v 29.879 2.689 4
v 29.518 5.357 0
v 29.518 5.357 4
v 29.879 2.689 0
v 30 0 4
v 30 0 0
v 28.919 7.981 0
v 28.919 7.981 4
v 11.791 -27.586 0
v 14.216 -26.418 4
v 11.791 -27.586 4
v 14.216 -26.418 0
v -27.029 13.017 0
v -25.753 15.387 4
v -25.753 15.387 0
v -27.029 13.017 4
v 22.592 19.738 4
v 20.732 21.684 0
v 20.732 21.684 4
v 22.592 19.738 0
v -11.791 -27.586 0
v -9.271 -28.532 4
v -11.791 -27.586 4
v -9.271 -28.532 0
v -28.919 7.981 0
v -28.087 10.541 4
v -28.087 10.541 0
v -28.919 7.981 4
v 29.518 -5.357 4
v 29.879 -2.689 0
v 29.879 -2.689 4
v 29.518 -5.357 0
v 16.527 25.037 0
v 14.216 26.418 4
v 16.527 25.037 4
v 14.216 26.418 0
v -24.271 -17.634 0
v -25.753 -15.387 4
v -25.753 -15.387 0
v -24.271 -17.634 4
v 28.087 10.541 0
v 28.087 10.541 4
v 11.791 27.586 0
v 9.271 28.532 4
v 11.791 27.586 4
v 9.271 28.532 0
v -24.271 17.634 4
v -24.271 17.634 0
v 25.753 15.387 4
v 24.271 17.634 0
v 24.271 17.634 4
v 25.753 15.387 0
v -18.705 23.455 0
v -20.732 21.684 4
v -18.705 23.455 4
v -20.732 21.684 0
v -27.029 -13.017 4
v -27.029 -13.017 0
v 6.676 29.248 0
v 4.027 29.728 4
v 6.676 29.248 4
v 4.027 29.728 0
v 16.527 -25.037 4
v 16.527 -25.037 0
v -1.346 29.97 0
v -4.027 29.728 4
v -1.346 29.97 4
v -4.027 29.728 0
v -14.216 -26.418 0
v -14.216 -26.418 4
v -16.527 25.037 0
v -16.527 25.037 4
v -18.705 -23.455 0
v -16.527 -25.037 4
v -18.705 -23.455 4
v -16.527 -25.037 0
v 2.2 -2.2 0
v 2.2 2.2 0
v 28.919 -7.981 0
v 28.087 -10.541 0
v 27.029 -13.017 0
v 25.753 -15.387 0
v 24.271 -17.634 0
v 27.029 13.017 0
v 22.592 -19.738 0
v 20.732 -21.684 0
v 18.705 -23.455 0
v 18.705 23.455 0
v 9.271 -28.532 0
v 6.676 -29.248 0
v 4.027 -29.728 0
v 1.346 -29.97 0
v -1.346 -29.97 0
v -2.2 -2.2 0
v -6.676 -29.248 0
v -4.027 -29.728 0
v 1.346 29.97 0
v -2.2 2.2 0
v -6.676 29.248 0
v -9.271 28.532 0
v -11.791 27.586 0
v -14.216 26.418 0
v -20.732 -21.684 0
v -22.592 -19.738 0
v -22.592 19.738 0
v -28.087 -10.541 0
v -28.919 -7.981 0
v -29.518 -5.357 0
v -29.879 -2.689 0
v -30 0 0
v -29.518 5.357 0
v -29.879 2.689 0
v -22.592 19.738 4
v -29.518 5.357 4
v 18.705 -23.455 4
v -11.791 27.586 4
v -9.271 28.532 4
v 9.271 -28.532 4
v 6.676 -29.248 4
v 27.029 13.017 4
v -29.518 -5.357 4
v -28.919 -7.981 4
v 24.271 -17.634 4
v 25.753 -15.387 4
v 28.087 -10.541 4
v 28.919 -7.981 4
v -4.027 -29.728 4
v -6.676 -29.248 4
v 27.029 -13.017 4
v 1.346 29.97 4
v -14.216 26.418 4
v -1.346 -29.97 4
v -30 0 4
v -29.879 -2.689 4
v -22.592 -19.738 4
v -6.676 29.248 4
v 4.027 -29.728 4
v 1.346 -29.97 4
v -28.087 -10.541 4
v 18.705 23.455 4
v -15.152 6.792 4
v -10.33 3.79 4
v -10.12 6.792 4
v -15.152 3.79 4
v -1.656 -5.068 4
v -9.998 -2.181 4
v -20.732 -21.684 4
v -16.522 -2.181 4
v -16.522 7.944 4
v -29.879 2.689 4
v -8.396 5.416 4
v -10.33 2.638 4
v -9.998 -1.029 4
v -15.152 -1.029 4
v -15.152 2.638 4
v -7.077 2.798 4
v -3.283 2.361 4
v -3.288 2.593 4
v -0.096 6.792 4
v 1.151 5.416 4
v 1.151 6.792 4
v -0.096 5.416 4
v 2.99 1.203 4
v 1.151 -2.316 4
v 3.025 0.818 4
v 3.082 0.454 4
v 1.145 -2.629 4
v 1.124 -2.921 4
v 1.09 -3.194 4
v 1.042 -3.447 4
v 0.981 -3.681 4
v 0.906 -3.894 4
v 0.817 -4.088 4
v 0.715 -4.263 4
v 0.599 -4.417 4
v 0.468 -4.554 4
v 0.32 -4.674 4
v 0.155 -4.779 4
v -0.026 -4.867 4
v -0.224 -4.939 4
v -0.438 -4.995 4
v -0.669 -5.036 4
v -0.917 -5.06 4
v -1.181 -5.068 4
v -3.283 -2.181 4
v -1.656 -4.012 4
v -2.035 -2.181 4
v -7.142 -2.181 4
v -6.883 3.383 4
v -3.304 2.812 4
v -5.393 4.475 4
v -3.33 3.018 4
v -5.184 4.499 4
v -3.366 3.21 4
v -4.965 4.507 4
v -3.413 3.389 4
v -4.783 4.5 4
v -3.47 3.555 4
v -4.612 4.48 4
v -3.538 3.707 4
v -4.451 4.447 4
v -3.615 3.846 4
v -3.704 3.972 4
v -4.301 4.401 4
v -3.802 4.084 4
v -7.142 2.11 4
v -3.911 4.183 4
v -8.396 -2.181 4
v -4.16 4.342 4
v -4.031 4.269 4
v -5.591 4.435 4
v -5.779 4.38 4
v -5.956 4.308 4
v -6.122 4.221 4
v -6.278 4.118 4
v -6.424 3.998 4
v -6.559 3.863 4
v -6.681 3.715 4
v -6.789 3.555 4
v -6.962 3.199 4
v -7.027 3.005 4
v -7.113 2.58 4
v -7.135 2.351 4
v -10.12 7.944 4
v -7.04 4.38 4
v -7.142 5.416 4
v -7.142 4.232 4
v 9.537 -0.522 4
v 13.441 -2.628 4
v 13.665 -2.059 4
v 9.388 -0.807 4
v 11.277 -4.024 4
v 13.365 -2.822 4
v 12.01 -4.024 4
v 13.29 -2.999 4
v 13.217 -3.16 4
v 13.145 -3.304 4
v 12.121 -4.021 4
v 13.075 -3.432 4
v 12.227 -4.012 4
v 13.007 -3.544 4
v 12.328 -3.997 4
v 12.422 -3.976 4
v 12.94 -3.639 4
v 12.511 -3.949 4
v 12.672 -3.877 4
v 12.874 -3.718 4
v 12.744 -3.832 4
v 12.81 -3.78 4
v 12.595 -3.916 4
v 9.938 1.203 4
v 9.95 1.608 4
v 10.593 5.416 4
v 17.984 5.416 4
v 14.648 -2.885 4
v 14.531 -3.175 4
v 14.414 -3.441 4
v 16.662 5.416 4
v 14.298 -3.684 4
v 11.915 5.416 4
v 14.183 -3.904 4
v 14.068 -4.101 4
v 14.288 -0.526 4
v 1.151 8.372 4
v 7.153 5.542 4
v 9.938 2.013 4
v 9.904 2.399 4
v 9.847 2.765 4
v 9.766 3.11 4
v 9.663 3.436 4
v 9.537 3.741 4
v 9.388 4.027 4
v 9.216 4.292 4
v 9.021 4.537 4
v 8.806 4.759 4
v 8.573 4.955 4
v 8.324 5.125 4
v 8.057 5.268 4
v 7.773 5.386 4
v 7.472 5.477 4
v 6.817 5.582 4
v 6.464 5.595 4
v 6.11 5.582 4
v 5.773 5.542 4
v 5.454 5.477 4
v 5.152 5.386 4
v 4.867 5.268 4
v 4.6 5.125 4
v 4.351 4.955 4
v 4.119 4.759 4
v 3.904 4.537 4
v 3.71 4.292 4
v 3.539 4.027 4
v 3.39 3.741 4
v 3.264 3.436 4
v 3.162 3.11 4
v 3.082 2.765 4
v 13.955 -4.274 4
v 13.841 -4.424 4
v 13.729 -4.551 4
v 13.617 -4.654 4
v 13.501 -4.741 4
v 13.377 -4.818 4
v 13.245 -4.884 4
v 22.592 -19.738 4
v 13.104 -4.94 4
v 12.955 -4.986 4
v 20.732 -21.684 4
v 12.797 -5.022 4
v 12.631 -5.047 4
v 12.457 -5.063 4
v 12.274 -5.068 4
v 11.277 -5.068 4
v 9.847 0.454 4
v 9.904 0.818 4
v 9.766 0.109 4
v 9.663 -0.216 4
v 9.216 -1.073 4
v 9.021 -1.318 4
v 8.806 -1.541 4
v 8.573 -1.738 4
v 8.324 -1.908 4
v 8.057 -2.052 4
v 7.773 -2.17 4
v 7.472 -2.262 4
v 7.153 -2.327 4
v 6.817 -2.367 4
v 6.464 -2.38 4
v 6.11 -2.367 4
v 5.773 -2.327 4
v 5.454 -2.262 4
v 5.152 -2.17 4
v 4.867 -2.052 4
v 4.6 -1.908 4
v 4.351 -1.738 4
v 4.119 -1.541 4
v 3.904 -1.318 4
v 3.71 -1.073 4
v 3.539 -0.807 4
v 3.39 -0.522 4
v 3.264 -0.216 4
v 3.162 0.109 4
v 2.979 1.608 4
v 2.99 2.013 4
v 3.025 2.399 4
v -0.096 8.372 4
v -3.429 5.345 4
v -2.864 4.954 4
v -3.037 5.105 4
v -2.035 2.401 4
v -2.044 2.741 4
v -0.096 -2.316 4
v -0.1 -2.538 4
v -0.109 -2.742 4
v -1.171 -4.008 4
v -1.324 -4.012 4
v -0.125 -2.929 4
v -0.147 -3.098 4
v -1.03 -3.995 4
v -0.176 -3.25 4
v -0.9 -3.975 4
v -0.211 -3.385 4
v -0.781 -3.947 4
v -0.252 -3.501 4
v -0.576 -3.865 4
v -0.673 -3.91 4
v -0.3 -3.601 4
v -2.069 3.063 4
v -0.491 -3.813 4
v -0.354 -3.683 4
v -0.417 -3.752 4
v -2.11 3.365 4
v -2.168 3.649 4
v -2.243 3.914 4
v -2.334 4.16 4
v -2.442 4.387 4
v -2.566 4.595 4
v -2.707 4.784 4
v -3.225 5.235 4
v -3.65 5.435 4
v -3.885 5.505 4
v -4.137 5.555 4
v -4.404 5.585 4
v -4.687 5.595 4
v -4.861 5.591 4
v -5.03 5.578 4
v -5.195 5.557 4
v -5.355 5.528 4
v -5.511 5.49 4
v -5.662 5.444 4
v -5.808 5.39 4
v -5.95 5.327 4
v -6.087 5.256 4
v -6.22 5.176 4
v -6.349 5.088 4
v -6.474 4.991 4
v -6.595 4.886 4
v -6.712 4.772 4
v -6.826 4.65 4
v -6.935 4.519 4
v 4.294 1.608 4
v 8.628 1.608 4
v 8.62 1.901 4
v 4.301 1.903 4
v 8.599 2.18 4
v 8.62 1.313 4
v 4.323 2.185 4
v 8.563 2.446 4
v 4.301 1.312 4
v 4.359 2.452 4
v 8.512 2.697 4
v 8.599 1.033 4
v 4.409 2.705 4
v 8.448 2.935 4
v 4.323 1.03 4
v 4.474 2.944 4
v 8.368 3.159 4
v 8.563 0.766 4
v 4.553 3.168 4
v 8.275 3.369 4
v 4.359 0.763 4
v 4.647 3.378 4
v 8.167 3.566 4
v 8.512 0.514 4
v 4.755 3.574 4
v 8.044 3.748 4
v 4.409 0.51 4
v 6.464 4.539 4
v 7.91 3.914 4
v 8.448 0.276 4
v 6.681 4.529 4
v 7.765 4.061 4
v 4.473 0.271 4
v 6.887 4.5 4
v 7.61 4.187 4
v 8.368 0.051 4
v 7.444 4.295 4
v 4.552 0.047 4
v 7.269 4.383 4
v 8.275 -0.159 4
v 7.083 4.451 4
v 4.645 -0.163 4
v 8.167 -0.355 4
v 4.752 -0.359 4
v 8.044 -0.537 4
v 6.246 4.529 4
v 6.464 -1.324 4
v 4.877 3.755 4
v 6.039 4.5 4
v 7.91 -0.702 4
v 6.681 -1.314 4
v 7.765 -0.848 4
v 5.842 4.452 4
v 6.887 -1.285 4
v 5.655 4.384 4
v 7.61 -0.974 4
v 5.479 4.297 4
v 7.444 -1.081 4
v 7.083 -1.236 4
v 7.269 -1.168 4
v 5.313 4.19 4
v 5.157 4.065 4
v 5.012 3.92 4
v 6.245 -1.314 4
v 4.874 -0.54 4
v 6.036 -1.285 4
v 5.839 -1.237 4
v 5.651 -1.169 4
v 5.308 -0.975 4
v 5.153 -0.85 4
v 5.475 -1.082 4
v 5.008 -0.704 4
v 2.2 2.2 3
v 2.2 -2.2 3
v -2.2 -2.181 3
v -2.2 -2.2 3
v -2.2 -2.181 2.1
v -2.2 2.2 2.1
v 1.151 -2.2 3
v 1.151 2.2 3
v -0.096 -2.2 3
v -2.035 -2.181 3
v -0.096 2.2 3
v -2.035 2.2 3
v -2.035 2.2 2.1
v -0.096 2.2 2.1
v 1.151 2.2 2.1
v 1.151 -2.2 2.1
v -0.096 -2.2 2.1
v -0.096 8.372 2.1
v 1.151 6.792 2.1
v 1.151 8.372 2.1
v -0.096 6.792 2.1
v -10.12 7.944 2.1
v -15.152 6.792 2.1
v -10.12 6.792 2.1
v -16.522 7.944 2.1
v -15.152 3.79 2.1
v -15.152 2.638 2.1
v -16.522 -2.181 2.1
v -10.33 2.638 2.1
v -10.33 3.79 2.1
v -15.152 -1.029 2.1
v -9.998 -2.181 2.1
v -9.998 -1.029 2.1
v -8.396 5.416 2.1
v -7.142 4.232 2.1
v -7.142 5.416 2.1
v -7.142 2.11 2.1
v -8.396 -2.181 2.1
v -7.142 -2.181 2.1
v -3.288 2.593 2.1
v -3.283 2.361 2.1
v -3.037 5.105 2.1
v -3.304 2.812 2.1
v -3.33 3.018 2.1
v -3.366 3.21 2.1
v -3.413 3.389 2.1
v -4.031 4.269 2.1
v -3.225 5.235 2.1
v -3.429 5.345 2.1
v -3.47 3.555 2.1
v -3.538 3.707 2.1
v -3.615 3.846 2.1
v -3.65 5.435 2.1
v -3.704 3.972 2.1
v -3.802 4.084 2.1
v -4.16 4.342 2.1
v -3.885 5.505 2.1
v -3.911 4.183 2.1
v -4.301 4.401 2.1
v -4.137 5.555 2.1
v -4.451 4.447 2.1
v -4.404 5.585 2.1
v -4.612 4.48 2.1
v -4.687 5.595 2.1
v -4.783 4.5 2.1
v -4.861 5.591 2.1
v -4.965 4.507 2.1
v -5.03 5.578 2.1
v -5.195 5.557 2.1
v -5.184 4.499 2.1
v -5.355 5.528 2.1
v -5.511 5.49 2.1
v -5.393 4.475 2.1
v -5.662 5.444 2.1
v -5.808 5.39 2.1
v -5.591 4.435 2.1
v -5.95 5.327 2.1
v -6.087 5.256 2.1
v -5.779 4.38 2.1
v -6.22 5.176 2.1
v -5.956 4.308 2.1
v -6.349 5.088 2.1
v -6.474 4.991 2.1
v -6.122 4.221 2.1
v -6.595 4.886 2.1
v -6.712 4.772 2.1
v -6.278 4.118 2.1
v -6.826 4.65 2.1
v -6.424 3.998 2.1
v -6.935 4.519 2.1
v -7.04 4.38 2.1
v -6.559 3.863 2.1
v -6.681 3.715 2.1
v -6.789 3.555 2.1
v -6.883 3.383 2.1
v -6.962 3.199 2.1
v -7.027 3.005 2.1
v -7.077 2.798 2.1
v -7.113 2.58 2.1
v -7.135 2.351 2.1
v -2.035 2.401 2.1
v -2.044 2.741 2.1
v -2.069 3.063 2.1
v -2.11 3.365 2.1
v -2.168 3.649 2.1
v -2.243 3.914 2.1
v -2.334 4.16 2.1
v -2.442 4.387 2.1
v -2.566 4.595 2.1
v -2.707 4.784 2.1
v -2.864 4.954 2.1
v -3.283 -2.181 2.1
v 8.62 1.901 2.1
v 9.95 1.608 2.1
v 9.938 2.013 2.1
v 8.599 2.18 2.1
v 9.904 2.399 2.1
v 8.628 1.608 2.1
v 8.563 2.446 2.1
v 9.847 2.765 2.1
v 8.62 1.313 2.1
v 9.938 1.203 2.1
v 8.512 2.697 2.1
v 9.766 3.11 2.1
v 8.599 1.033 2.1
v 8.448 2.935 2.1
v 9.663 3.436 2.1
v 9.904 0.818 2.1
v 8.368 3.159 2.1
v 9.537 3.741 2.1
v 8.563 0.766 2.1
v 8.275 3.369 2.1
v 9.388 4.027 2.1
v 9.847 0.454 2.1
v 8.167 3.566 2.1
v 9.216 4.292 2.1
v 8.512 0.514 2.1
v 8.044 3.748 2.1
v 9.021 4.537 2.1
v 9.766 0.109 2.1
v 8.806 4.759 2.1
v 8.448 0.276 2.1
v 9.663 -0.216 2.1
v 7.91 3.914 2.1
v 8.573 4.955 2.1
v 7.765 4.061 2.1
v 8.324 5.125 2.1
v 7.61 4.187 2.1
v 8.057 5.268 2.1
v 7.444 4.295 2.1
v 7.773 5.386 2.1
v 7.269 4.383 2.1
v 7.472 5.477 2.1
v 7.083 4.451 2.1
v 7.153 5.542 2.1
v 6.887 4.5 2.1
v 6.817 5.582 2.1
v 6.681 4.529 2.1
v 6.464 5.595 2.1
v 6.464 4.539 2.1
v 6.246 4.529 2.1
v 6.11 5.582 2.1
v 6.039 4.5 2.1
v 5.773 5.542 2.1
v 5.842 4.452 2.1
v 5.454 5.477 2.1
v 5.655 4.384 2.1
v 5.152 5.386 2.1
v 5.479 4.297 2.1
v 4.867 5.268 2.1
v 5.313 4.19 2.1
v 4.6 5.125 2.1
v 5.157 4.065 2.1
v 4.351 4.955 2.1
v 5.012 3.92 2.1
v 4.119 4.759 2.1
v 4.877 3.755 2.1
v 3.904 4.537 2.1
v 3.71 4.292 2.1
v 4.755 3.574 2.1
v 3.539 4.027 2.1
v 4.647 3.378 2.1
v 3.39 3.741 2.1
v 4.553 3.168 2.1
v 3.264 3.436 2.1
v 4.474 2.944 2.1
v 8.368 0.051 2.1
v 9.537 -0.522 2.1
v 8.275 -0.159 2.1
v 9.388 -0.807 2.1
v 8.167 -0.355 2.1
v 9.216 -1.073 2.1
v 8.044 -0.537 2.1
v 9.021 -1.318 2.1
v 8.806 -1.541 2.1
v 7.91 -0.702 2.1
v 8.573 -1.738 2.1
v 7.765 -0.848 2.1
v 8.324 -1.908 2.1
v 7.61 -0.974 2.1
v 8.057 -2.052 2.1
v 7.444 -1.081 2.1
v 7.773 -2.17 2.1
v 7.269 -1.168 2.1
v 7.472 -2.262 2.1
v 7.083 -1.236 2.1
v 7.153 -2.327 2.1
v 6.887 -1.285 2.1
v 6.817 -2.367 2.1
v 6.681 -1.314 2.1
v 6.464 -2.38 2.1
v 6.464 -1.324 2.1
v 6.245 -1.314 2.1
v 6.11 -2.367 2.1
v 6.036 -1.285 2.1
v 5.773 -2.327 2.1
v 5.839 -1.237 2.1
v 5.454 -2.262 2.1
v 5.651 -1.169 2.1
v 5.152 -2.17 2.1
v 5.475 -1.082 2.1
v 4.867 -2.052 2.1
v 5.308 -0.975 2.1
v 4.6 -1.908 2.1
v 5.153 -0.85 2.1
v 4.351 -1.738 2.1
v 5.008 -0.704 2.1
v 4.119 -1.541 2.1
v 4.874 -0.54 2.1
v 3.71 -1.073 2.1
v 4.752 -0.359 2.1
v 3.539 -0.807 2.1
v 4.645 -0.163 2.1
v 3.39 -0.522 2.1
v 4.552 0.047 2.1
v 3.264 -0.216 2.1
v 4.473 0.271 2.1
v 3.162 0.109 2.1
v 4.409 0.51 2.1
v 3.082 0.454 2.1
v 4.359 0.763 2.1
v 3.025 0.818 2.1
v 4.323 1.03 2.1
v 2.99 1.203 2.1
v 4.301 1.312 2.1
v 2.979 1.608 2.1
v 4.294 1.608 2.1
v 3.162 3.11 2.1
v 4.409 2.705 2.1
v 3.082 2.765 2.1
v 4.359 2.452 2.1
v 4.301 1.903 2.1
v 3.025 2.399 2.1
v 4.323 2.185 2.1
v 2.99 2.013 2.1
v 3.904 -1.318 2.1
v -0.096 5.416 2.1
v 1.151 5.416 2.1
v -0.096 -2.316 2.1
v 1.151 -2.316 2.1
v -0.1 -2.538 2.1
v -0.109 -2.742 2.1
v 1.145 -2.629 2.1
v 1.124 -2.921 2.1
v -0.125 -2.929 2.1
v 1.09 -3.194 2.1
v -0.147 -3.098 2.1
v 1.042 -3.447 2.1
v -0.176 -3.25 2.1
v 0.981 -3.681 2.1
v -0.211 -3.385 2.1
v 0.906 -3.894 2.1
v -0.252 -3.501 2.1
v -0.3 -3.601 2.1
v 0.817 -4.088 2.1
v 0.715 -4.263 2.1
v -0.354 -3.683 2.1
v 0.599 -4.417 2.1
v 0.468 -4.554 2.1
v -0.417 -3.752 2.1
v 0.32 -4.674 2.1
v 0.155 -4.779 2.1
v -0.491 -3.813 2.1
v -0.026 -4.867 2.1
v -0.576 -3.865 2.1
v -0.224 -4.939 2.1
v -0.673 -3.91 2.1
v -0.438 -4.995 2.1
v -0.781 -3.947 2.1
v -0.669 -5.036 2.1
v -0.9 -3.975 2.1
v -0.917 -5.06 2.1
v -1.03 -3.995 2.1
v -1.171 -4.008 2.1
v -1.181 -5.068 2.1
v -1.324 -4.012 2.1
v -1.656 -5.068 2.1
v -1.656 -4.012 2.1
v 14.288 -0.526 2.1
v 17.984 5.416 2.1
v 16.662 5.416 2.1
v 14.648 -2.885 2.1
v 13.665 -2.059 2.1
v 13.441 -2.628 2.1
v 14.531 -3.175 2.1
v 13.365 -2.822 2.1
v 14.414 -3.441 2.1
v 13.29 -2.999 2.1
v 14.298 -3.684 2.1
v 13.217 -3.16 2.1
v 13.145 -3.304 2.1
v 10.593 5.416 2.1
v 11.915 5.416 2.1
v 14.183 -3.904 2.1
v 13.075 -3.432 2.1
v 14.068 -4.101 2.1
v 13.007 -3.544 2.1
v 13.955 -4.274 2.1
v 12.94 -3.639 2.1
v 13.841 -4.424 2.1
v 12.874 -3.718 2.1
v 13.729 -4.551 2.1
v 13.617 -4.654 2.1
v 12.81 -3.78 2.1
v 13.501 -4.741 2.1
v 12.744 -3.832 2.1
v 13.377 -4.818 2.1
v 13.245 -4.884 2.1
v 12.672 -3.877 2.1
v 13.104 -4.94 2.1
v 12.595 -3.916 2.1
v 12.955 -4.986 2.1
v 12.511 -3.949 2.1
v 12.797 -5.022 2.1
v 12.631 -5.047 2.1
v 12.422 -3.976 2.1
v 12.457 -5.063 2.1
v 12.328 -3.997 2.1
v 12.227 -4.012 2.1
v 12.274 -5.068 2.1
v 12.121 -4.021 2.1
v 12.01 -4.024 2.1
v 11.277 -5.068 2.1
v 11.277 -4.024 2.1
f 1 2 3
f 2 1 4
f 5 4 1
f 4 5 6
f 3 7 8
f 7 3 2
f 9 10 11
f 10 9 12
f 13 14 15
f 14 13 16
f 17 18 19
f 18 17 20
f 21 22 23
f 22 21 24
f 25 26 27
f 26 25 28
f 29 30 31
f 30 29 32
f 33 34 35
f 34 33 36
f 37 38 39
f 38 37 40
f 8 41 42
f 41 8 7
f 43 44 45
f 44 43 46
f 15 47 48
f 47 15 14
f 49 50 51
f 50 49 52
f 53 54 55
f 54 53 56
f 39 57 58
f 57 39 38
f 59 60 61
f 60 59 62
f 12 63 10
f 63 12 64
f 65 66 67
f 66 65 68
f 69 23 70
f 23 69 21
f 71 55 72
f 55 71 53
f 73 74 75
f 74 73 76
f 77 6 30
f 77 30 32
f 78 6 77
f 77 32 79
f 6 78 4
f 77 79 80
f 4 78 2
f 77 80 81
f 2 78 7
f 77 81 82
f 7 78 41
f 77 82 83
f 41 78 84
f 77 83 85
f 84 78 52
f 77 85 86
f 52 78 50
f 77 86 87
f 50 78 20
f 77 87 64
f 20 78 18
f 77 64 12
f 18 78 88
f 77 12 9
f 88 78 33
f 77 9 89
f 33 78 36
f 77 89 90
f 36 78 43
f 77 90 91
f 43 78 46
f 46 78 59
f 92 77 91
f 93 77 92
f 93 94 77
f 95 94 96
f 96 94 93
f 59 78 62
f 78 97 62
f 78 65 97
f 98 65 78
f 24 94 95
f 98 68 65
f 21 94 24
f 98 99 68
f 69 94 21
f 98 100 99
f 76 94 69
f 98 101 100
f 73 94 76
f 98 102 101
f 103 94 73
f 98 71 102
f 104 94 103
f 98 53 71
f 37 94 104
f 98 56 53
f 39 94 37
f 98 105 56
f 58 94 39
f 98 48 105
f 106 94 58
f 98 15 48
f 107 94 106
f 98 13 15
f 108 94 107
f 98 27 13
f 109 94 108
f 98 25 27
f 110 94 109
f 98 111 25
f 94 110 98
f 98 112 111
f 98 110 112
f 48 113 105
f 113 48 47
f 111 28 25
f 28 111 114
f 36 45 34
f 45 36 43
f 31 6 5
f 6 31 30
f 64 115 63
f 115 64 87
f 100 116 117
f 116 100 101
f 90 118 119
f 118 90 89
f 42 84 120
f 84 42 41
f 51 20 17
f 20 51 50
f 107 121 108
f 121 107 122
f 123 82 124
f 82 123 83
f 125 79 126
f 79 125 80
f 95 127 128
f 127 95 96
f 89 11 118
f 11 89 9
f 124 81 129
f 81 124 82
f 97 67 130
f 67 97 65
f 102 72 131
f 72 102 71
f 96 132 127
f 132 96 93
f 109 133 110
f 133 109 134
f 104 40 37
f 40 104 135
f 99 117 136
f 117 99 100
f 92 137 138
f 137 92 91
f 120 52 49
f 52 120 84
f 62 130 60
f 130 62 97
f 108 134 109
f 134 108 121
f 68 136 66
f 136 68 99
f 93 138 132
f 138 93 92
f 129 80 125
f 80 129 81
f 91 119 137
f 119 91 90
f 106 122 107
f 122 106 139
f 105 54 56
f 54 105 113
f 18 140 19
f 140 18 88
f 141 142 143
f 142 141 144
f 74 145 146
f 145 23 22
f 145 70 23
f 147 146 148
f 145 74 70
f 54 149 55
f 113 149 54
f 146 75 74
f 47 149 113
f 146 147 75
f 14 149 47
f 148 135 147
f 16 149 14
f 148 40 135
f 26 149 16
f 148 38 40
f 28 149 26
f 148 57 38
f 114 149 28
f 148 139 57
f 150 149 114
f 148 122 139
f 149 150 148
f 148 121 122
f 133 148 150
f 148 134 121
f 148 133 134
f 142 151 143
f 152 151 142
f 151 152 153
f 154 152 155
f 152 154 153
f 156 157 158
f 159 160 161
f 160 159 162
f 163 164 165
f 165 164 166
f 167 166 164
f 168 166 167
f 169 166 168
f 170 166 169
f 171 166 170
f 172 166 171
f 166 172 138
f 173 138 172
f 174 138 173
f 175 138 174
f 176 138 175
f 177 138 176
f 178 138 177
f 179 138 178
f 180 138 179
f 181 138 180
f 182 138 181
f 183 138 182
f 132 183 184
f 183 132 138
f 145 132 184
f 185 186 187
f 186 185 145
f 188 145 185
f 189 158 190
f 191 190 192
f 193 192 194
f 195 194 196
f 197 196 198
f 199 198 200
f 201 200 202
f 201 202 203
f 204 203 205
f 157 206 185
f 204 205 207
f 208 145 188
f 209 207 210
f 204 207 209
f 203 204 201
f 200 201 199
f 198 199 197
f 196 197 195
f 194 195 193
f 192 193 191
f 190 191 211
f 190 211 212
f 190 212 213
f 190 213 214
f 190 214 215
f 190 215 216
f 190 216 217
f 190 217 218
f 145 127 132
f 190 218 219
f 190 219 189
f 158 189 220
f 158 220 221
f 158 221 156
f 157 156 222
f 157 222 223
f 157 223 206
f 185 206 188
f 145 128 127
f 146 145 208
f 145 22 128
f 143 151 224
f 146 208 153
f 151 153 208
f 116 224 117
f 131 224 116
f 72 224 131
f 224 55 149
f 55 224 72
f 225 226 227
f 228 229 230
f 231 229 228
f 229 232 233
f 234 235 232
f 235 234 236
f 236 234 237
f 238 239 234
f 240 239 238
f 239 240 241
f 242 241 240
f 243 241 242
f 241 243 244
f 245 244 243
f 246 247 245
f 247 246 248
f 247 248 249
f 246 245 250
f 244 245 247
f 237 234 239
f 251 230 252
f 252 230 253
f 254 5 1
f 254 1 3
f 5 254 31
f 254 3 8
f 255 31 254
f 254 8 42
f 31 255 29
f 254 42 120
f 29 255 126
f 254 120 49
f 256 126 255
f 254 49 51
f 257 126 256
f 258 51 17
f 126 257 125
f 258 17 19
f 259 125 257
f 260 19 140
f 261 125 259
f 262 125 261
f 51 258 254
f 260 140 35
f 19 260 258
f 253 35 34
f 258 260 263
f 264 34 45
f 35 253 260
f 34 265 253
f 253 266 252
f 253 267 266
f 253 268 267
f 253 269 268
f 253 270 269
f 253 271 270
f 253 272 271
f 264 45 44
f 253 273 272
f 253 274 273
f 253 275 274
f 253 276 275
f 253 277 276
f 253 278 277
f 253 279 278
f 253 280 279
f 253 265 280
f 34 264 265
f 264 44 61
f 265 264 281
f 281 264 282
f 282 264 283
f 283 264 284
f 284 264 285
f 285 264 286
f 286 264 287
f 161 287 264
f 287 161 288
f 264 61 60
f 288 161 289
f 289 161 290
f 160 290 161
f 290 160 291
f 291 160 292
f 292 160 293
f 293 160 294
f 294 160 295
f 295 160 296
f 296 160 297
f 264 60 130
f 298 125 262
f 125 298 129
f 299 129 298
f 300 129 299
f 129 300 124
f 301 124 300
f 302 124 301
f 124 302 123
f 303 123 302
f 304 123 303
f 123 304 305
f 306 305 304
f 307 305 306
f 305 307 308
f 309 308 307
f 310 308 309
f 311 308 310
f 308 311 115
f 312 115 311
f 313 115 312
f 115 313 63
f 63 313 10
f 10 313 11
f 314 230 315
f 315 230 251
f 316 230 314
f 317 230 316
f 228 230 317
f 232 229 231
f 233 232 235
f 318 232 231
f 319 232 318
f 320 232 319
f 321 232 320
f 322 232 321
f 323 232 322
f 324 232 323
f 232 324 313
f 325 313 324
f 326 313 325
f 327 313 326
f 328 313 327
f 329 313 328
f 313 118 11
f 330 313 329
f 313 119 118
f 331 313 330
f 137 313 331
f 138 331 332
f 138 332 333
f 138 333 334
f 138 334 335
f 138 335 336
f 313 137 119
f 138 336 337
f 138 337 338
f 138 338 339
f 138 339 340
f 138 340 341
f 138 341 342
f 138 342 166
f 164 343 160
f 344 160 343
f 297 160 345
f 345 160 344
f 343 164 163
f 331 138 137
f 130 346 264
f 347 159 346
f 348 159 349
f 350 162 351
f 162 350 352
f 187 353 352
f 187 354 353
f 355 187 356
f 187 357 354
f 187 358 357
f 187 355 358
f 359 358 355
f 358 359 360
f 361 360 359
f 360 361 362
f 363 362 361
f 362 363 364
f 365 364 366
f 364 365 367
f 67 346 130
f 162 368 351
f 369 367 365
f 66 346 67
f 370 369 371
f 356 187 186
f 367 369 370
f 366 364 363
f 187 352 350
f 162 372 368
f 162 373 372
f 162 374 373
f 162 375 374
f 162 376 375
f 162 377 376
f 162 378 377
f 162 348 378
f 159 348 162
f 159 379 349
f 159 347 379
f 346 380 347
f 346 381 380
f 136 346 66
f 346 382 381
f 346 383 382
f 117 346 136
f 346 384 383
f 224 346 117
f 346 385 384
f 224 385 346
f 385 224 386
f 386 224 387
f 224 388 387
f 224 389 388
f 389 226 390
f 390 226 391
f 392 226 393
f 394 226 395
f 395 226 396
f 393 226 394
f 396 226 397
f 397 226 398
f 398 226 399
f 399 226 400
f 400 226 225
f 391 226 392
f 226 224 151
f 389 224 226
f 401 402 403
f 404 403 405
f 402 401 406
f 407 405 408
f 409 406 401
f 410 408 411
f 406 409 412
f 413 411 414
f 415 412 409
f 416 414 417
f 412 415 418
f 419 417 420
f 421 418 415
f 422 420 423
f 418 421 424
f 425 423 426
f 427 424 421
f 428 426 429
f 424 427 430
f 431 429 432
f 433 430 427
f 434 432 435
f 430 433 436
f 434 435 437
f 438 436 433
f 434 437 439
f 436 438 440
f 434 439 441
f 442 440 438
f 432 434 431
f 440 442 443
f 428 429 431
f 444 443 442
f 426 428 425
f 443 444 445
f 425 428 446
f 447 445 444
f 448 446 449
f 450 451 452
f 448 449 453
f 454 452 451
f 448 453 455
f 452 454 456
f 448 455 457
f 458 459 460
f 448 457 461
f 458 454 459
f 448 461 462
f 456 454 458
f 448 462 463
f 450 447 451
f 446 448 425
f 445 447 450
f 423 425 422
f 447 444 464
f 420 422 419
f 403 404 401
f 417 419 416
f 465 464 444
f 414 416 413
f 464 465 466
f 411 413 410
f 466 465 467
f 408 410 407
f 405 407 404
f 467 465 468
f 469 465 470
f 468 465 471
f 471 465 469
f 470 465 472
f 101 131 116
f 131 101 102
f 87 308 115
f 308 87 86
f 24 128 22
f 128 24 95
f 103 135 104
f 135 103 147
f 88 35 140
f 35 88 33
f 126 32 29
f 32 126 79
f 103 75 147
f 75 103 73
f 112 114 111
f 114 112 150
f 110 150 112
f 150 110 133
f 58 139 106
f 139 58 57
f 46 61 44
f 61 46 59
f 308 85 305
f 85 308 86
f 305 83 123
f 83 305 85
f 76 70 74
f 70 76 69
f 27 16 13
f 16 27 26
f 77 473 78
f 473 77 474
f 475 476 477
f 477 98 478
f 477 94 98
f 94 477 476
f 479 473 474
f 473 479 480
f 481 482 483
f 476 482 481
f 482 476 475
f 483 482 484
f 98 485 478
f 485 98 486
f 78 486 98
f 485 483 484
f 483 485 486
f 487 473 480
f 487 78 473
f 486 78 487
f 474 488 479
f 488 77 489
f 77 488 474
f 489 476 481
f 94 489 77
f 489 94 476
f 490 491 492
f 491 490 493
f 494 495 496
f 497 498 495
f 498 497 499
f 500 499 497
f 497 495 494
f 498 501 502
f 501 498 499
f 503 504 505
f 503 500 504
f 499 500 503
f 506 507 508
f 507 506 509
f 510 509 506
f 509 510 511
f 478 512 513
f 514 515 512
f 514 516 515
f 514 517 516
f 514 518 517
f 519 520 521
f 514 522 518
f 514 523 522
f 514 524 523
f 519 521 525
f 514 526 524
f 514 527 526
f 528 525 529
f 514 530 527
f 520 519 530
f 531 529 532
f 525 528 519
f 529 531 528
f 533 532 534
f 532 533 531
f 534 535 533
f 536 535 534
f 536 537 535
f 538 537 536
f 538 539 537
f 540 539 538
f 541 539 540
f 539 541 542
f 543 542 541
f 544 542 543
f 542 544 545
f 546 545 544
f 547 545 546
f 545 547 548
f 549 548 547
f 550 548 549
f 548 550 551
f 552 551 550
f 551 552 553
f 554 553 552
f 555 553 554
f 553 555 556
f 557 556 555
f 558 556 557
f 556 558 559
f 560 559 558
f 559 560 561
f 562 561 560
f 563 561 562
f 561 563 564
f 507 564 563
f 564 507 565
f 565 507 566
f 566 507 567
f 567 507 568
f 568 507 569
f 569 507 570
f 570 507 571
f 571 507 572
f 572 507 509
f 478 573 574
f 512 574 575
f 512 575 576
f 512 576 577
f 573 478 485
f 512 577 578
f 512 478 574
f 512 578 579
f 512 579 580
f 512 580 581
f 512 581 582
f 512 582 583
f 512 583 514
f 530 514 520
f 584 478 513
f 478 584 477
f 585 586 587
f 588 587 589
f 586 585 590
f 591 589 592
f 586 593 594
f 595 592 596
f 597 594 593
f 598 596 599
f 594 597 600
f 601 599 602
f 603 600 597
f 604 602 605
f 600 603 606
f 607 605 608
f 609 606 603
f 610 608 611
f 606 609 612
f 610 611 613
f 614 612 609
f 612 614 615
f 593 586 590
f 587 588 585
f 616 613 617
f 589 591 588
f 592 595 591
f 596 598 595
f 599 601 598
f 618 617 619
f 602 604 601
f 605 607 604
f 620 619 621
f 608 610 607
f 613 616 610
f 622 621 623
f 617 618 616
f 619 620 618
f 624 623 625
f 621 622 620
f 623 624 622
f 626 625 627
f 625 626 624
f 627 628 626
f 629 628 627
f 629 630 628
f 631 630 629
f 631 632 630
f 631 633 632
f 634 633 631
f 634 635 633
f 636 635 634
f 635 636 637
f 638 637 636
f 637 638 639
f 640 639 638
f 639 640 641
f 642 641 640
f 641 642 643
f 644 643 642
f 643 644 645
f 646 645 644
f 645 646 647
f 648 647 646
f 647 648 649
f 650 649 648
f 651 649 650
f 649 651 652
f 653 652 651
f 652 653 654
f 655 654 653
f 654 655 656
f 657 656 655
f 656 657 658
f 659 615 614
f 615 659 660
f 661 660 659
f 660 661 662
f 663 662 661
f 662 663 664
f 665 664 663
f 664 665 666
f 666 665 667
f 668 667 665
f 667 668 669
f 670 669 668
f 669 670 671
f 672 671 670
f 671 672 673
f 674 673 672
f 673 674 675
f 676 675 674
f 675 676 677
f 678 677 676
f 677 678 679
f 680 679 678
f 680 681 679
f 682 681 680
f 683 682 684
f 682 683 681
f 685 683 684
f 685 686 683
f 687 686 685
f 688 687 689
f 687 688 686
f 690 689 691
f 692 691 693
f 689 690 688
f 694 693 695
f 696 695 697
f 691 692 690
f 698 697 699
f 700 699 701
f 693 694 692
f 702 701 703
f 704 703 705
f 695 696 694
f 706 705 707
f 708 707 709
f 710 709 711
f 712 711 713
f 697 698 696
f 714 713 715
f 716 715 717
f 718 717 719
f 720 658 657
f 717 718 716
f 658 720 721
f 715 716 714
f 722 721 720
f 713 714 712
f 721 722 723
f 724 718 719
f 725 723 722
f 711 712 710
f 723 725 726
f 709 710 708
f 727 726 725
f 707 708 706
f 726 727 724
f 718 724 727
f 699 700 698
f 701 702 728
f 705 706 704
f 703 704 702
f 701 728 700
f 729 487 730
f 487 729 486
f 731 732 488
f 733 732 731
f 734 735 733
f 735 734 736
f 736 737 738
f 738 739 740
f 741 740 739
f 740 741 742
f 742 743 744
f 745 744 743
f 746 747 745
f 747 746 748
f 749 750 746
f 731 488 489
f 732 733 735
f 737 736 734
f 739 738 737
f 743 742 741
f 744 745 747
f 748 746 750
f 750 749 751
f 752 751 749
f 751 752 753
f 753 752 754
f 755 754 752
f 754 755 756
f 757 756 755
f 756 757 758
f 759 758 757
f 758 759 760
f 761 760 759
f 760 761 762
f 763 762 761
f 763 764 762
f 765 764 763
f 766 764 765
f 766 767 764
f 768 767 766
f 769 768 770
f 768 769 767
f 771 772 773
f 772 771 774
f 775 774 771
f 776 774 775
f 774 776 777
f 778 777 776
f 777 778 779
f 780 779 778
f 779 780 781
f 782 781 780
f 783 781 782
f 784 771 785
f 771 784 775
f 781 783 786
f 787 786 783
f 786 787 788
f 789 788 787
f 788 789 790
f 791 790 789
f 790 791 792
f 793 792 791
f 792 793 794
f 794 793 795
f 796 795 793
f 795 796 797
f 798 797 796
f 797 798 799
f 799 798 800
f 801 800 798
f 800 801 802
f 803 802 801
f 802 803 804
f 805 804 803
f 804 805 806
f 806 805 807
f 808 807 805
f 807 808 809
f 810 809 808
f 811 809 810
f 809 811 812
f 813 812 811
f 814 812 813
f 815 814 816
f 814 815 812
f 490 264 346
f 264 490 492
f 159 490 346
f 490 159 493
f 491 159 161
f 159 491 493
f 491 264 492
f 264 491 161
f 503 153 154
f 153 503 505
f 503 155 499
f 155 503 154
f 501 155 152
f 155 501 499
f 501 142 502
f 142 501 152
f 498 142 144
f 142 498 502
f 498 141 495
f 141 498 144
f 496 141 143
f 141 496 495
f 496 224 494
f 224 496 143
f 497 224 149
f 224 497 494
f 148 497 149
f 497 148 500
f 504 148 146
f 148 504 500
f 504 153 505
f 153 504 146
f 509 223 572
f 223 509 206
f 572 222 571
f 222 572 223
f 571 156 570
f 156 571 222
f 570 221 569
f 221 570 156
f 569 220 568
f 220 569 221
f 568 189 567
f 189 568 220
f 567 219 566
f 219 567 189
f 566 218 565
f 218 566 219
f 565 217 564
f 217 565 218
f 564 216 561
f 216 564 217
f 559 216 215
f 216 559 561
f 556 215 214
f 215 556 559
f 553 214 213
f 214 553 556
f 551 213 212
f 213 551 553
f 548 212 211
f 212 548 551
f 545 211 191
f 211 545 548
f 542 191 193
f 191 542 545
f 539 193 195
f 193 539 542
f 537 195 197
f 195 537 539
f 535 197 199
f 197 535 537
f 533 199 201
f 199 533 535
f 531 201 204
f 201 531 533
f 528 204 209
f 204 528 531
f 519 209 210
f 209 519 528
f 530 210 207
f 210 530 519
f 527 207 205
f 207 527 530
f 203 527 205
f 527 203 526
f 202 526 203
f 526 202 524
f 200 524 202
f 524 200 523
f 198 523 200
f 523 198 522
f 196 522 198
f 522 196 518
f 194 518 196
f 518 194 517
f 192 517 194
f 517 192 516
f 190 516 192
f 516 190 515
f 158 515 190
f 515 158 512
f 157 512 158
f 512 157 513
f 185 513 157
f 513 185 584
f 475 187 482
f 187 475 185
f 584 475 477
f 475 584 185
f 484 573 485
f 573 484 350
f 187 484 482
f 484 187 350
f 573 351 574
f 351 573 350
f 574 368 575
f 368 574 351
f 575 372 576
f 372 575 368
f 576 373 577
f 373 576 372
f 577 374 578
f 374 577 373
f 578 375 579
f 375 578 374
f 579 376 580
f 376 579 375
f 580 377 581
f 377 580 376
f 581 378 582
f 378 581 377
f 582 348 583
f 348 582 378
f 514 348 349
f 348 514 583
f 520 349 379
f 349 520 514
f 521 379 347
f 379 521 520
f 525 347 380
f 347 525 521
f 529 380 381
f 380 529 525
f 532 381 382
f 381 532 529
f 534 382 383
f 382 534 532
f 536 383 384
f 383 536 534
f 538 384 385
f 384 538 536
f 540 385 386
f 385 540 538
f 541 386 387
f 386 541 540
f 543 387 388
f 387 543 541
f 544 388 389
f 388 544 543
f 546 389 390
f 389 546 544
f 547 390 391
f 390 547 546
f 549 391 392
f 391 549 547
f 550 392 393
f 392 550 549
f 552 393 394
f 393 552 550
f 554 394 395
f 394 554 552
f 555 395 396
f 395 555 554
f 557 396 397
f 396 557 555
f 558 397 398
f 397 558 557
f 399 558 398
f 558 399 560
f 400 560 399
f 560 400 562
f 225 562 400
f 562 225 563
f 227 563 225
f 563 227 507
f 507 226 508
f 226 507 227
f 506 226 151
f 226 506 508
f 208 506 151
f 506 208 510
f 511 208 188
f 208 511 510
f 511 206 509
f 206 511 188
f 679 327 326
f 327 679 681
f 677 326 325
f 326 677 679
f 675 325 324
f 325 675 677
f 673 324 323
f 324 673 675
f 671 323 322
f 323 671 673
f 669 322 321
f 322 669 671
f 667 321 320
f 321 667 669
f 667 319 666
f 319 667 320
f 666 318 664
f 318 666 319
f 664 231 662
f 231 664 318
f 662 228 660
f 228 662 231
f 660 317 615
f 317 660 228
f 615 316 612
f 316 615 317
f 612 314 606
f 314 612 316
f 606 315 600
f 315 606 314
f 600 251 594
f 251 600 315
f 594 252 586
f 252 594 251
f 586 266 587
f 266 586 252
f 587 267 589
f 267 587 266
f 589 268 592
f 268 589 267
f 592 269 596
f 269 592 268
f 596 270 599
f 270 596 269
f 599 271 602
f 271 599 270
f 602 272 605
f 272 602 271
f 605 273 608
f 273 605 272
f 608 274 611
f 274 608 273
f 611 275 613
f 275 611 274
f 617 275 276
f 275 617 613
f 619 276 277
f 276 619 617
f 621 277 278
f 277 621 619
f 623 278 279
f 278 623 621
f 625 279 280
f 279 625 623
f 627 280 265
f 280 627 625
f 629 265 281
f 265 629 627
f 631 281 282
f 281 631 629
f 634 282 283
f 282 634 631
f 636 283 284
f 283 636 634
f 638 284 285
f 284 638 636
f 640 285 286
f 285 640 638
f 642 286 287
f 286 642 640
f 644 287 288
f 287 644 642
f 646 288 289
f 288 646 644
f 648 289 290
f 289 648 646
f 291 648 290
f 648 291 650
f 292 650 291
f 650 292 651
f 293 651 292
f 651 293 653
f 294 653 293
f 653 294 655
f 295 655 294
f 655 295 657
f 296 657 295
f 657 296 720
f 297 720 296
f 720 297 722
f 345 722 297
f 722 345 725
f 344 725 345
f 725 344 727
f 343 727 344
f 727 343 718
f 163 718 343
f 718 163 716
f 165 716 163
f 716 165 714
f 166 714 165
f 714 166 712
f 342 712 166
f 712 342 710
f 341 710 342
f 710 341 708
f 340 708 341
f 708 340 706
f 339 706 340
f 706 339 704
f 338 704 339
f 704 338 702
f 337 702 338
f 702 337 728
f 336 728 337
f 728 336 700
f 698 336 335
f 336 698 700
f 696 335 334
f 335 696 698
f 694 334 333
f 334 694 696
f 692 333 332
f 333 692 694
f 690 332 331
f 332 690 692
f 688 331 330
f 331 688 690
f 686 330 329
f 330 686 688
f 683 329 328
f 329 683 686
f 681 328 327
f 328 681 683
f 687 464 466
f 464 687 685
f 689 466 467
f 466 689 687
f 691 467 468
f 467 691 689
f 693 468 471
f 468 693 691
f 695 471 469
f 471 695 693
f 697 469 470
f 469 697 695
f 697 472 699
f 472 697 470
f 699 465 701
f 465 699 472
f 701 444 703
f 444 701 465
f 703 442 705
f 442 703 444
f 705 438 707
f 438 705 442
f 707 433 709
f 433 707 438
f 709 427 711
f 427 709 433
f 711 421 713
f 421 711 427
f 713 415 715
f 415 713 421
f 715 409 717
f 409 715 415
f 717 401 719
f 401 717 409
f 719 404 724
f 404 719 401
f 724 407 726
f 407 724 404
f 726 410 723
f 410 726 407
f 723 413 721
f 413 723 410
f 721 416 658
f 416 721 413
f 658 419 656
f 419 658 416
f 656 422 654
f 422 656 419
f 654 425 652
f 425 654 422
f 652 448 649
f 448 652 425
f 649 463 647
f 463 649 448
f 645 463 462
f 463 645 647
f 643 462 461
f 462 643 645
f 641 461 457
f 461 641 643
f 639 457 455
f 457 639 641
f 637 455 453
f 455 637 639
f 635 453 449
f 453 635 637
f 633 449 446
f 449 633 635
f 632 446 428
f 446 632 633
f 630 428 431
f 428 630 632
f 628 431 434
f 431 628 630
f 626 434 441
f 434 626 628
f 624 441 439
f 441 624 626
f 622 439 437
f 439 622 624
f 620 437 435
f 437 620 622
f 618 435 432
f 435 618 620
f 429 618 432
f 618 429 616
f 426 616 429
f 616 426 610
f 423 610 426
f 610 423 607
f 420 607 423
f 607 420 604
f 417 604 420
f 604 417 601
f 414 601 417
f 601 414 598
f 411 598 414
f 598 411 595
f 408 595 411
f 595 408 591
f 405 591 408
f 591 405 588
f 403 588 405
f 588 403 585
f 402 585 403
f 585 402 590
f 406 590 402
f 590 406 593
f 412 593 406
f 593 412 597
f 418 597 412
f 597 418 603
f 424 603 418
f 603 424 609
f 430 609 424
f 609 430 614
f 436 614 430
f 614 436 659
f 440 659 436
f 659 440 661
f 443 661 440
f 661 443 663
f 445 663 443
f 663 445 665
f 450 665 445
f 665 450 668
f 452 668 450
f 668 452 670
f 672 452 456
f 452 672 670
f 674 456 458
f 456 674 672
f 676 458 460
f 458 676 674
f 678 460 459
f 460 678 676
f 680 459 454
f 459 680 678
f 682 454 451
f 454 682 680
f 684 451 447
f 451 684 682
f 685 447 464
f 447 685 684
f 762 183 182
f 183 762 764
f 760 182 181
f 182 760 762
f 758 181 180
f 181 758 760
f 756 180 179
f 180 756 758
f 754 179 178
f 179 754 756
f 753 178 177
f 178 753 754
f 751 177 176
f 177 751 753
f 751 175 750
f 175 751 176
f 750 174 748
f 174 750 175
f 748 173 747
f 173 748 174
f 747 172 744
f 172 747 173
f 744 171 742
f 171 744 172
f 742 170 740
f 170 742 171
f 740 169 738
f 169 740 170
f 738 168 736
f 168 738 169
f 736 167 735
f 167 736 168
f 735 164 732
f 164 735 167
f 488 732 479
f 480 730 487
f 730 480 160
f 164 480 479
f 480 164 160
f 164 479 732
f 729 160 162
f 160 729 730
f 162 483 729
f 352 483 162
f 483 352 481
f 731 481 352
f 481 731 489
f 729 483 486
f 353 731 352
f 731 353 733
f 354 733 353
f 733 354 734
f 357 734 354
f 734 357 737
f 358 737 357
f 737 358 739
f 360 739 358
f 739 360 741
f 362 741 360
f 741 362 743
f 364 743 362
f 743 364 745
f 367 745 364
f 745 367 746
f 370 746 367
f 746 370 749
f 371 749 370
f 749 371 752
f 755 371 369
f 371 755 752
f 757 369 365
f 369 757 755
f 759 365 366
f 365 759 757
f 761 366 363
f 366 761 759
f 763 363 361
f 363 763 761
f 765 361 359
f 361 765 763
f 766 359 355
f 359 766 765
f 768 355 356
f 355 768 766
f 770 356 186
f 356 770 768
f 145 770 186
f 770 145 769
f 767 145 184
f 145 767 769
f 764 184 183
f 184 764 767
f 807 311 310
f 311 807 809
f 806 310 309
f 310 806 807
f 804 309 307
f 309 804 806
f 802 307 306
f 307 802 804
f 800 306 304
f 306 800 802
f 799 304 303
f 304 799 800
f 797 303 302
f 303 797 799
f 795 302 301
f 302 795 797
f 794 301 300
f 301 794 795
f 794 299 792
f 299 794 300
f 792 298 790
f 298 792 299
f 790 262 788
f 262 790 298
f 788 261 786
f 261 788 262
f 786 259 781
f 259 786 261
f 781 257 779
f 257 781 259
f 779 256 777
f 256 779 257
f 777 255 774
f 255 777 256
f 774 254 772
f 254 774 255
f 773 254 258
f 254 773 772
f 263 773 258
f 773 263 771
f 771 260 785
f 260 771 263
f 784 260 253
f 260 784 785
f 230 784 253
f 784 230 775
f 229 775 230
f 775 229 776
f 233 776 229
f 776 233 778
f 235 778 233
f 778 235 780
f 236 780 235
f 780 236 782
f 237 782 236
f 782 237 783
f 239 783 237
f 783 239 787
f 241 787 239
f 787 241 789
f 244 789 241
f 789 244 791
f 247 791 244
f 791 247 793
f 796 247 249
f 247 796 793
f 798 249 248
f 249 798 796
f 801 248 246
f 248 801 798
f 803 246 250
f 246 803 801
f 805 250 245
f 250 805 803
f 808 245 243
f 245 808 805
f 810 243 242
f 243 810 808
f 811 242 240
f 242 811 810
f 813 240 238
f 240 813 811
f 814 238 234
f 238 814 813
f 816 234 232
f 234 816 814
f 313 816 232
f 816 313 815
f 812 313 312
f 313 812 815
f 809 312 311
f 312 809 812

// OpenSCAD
/* 
* File : phholder_padv.scad 
* Author : witabix33  (https://github.com/witabix33)
* Description : A very simple phone headset holder that can be placed on a work position separator
*
* This is the main file to print ONLY advertiser part
* File name has been shortened to help conversion to STL and GCOD that printers like being short
*
* Version 04 bld 28.04.2023
*/
include <phone_holder_parts.scad>


$fa = 1;
$fs = 0.4;
$fn = 70;  // resolution may be increased to have a better result
/* main_assemble module - final assembly
 * isTextEnabled : true => also print text
  * hasPin : true=> draw pins / false => draw holes
 */
module main_assemble(isTextEnabled=false, hasPin=false) {

    // draw advertiser part ONLY
    translate([0,0,default_adv_height/2])
        part_advertise(isTextEnabled=isTextEnabled, hasPin=hasPin)   ;   
}
 main_assemble(isTextEnabled=true, hasPin=false);
